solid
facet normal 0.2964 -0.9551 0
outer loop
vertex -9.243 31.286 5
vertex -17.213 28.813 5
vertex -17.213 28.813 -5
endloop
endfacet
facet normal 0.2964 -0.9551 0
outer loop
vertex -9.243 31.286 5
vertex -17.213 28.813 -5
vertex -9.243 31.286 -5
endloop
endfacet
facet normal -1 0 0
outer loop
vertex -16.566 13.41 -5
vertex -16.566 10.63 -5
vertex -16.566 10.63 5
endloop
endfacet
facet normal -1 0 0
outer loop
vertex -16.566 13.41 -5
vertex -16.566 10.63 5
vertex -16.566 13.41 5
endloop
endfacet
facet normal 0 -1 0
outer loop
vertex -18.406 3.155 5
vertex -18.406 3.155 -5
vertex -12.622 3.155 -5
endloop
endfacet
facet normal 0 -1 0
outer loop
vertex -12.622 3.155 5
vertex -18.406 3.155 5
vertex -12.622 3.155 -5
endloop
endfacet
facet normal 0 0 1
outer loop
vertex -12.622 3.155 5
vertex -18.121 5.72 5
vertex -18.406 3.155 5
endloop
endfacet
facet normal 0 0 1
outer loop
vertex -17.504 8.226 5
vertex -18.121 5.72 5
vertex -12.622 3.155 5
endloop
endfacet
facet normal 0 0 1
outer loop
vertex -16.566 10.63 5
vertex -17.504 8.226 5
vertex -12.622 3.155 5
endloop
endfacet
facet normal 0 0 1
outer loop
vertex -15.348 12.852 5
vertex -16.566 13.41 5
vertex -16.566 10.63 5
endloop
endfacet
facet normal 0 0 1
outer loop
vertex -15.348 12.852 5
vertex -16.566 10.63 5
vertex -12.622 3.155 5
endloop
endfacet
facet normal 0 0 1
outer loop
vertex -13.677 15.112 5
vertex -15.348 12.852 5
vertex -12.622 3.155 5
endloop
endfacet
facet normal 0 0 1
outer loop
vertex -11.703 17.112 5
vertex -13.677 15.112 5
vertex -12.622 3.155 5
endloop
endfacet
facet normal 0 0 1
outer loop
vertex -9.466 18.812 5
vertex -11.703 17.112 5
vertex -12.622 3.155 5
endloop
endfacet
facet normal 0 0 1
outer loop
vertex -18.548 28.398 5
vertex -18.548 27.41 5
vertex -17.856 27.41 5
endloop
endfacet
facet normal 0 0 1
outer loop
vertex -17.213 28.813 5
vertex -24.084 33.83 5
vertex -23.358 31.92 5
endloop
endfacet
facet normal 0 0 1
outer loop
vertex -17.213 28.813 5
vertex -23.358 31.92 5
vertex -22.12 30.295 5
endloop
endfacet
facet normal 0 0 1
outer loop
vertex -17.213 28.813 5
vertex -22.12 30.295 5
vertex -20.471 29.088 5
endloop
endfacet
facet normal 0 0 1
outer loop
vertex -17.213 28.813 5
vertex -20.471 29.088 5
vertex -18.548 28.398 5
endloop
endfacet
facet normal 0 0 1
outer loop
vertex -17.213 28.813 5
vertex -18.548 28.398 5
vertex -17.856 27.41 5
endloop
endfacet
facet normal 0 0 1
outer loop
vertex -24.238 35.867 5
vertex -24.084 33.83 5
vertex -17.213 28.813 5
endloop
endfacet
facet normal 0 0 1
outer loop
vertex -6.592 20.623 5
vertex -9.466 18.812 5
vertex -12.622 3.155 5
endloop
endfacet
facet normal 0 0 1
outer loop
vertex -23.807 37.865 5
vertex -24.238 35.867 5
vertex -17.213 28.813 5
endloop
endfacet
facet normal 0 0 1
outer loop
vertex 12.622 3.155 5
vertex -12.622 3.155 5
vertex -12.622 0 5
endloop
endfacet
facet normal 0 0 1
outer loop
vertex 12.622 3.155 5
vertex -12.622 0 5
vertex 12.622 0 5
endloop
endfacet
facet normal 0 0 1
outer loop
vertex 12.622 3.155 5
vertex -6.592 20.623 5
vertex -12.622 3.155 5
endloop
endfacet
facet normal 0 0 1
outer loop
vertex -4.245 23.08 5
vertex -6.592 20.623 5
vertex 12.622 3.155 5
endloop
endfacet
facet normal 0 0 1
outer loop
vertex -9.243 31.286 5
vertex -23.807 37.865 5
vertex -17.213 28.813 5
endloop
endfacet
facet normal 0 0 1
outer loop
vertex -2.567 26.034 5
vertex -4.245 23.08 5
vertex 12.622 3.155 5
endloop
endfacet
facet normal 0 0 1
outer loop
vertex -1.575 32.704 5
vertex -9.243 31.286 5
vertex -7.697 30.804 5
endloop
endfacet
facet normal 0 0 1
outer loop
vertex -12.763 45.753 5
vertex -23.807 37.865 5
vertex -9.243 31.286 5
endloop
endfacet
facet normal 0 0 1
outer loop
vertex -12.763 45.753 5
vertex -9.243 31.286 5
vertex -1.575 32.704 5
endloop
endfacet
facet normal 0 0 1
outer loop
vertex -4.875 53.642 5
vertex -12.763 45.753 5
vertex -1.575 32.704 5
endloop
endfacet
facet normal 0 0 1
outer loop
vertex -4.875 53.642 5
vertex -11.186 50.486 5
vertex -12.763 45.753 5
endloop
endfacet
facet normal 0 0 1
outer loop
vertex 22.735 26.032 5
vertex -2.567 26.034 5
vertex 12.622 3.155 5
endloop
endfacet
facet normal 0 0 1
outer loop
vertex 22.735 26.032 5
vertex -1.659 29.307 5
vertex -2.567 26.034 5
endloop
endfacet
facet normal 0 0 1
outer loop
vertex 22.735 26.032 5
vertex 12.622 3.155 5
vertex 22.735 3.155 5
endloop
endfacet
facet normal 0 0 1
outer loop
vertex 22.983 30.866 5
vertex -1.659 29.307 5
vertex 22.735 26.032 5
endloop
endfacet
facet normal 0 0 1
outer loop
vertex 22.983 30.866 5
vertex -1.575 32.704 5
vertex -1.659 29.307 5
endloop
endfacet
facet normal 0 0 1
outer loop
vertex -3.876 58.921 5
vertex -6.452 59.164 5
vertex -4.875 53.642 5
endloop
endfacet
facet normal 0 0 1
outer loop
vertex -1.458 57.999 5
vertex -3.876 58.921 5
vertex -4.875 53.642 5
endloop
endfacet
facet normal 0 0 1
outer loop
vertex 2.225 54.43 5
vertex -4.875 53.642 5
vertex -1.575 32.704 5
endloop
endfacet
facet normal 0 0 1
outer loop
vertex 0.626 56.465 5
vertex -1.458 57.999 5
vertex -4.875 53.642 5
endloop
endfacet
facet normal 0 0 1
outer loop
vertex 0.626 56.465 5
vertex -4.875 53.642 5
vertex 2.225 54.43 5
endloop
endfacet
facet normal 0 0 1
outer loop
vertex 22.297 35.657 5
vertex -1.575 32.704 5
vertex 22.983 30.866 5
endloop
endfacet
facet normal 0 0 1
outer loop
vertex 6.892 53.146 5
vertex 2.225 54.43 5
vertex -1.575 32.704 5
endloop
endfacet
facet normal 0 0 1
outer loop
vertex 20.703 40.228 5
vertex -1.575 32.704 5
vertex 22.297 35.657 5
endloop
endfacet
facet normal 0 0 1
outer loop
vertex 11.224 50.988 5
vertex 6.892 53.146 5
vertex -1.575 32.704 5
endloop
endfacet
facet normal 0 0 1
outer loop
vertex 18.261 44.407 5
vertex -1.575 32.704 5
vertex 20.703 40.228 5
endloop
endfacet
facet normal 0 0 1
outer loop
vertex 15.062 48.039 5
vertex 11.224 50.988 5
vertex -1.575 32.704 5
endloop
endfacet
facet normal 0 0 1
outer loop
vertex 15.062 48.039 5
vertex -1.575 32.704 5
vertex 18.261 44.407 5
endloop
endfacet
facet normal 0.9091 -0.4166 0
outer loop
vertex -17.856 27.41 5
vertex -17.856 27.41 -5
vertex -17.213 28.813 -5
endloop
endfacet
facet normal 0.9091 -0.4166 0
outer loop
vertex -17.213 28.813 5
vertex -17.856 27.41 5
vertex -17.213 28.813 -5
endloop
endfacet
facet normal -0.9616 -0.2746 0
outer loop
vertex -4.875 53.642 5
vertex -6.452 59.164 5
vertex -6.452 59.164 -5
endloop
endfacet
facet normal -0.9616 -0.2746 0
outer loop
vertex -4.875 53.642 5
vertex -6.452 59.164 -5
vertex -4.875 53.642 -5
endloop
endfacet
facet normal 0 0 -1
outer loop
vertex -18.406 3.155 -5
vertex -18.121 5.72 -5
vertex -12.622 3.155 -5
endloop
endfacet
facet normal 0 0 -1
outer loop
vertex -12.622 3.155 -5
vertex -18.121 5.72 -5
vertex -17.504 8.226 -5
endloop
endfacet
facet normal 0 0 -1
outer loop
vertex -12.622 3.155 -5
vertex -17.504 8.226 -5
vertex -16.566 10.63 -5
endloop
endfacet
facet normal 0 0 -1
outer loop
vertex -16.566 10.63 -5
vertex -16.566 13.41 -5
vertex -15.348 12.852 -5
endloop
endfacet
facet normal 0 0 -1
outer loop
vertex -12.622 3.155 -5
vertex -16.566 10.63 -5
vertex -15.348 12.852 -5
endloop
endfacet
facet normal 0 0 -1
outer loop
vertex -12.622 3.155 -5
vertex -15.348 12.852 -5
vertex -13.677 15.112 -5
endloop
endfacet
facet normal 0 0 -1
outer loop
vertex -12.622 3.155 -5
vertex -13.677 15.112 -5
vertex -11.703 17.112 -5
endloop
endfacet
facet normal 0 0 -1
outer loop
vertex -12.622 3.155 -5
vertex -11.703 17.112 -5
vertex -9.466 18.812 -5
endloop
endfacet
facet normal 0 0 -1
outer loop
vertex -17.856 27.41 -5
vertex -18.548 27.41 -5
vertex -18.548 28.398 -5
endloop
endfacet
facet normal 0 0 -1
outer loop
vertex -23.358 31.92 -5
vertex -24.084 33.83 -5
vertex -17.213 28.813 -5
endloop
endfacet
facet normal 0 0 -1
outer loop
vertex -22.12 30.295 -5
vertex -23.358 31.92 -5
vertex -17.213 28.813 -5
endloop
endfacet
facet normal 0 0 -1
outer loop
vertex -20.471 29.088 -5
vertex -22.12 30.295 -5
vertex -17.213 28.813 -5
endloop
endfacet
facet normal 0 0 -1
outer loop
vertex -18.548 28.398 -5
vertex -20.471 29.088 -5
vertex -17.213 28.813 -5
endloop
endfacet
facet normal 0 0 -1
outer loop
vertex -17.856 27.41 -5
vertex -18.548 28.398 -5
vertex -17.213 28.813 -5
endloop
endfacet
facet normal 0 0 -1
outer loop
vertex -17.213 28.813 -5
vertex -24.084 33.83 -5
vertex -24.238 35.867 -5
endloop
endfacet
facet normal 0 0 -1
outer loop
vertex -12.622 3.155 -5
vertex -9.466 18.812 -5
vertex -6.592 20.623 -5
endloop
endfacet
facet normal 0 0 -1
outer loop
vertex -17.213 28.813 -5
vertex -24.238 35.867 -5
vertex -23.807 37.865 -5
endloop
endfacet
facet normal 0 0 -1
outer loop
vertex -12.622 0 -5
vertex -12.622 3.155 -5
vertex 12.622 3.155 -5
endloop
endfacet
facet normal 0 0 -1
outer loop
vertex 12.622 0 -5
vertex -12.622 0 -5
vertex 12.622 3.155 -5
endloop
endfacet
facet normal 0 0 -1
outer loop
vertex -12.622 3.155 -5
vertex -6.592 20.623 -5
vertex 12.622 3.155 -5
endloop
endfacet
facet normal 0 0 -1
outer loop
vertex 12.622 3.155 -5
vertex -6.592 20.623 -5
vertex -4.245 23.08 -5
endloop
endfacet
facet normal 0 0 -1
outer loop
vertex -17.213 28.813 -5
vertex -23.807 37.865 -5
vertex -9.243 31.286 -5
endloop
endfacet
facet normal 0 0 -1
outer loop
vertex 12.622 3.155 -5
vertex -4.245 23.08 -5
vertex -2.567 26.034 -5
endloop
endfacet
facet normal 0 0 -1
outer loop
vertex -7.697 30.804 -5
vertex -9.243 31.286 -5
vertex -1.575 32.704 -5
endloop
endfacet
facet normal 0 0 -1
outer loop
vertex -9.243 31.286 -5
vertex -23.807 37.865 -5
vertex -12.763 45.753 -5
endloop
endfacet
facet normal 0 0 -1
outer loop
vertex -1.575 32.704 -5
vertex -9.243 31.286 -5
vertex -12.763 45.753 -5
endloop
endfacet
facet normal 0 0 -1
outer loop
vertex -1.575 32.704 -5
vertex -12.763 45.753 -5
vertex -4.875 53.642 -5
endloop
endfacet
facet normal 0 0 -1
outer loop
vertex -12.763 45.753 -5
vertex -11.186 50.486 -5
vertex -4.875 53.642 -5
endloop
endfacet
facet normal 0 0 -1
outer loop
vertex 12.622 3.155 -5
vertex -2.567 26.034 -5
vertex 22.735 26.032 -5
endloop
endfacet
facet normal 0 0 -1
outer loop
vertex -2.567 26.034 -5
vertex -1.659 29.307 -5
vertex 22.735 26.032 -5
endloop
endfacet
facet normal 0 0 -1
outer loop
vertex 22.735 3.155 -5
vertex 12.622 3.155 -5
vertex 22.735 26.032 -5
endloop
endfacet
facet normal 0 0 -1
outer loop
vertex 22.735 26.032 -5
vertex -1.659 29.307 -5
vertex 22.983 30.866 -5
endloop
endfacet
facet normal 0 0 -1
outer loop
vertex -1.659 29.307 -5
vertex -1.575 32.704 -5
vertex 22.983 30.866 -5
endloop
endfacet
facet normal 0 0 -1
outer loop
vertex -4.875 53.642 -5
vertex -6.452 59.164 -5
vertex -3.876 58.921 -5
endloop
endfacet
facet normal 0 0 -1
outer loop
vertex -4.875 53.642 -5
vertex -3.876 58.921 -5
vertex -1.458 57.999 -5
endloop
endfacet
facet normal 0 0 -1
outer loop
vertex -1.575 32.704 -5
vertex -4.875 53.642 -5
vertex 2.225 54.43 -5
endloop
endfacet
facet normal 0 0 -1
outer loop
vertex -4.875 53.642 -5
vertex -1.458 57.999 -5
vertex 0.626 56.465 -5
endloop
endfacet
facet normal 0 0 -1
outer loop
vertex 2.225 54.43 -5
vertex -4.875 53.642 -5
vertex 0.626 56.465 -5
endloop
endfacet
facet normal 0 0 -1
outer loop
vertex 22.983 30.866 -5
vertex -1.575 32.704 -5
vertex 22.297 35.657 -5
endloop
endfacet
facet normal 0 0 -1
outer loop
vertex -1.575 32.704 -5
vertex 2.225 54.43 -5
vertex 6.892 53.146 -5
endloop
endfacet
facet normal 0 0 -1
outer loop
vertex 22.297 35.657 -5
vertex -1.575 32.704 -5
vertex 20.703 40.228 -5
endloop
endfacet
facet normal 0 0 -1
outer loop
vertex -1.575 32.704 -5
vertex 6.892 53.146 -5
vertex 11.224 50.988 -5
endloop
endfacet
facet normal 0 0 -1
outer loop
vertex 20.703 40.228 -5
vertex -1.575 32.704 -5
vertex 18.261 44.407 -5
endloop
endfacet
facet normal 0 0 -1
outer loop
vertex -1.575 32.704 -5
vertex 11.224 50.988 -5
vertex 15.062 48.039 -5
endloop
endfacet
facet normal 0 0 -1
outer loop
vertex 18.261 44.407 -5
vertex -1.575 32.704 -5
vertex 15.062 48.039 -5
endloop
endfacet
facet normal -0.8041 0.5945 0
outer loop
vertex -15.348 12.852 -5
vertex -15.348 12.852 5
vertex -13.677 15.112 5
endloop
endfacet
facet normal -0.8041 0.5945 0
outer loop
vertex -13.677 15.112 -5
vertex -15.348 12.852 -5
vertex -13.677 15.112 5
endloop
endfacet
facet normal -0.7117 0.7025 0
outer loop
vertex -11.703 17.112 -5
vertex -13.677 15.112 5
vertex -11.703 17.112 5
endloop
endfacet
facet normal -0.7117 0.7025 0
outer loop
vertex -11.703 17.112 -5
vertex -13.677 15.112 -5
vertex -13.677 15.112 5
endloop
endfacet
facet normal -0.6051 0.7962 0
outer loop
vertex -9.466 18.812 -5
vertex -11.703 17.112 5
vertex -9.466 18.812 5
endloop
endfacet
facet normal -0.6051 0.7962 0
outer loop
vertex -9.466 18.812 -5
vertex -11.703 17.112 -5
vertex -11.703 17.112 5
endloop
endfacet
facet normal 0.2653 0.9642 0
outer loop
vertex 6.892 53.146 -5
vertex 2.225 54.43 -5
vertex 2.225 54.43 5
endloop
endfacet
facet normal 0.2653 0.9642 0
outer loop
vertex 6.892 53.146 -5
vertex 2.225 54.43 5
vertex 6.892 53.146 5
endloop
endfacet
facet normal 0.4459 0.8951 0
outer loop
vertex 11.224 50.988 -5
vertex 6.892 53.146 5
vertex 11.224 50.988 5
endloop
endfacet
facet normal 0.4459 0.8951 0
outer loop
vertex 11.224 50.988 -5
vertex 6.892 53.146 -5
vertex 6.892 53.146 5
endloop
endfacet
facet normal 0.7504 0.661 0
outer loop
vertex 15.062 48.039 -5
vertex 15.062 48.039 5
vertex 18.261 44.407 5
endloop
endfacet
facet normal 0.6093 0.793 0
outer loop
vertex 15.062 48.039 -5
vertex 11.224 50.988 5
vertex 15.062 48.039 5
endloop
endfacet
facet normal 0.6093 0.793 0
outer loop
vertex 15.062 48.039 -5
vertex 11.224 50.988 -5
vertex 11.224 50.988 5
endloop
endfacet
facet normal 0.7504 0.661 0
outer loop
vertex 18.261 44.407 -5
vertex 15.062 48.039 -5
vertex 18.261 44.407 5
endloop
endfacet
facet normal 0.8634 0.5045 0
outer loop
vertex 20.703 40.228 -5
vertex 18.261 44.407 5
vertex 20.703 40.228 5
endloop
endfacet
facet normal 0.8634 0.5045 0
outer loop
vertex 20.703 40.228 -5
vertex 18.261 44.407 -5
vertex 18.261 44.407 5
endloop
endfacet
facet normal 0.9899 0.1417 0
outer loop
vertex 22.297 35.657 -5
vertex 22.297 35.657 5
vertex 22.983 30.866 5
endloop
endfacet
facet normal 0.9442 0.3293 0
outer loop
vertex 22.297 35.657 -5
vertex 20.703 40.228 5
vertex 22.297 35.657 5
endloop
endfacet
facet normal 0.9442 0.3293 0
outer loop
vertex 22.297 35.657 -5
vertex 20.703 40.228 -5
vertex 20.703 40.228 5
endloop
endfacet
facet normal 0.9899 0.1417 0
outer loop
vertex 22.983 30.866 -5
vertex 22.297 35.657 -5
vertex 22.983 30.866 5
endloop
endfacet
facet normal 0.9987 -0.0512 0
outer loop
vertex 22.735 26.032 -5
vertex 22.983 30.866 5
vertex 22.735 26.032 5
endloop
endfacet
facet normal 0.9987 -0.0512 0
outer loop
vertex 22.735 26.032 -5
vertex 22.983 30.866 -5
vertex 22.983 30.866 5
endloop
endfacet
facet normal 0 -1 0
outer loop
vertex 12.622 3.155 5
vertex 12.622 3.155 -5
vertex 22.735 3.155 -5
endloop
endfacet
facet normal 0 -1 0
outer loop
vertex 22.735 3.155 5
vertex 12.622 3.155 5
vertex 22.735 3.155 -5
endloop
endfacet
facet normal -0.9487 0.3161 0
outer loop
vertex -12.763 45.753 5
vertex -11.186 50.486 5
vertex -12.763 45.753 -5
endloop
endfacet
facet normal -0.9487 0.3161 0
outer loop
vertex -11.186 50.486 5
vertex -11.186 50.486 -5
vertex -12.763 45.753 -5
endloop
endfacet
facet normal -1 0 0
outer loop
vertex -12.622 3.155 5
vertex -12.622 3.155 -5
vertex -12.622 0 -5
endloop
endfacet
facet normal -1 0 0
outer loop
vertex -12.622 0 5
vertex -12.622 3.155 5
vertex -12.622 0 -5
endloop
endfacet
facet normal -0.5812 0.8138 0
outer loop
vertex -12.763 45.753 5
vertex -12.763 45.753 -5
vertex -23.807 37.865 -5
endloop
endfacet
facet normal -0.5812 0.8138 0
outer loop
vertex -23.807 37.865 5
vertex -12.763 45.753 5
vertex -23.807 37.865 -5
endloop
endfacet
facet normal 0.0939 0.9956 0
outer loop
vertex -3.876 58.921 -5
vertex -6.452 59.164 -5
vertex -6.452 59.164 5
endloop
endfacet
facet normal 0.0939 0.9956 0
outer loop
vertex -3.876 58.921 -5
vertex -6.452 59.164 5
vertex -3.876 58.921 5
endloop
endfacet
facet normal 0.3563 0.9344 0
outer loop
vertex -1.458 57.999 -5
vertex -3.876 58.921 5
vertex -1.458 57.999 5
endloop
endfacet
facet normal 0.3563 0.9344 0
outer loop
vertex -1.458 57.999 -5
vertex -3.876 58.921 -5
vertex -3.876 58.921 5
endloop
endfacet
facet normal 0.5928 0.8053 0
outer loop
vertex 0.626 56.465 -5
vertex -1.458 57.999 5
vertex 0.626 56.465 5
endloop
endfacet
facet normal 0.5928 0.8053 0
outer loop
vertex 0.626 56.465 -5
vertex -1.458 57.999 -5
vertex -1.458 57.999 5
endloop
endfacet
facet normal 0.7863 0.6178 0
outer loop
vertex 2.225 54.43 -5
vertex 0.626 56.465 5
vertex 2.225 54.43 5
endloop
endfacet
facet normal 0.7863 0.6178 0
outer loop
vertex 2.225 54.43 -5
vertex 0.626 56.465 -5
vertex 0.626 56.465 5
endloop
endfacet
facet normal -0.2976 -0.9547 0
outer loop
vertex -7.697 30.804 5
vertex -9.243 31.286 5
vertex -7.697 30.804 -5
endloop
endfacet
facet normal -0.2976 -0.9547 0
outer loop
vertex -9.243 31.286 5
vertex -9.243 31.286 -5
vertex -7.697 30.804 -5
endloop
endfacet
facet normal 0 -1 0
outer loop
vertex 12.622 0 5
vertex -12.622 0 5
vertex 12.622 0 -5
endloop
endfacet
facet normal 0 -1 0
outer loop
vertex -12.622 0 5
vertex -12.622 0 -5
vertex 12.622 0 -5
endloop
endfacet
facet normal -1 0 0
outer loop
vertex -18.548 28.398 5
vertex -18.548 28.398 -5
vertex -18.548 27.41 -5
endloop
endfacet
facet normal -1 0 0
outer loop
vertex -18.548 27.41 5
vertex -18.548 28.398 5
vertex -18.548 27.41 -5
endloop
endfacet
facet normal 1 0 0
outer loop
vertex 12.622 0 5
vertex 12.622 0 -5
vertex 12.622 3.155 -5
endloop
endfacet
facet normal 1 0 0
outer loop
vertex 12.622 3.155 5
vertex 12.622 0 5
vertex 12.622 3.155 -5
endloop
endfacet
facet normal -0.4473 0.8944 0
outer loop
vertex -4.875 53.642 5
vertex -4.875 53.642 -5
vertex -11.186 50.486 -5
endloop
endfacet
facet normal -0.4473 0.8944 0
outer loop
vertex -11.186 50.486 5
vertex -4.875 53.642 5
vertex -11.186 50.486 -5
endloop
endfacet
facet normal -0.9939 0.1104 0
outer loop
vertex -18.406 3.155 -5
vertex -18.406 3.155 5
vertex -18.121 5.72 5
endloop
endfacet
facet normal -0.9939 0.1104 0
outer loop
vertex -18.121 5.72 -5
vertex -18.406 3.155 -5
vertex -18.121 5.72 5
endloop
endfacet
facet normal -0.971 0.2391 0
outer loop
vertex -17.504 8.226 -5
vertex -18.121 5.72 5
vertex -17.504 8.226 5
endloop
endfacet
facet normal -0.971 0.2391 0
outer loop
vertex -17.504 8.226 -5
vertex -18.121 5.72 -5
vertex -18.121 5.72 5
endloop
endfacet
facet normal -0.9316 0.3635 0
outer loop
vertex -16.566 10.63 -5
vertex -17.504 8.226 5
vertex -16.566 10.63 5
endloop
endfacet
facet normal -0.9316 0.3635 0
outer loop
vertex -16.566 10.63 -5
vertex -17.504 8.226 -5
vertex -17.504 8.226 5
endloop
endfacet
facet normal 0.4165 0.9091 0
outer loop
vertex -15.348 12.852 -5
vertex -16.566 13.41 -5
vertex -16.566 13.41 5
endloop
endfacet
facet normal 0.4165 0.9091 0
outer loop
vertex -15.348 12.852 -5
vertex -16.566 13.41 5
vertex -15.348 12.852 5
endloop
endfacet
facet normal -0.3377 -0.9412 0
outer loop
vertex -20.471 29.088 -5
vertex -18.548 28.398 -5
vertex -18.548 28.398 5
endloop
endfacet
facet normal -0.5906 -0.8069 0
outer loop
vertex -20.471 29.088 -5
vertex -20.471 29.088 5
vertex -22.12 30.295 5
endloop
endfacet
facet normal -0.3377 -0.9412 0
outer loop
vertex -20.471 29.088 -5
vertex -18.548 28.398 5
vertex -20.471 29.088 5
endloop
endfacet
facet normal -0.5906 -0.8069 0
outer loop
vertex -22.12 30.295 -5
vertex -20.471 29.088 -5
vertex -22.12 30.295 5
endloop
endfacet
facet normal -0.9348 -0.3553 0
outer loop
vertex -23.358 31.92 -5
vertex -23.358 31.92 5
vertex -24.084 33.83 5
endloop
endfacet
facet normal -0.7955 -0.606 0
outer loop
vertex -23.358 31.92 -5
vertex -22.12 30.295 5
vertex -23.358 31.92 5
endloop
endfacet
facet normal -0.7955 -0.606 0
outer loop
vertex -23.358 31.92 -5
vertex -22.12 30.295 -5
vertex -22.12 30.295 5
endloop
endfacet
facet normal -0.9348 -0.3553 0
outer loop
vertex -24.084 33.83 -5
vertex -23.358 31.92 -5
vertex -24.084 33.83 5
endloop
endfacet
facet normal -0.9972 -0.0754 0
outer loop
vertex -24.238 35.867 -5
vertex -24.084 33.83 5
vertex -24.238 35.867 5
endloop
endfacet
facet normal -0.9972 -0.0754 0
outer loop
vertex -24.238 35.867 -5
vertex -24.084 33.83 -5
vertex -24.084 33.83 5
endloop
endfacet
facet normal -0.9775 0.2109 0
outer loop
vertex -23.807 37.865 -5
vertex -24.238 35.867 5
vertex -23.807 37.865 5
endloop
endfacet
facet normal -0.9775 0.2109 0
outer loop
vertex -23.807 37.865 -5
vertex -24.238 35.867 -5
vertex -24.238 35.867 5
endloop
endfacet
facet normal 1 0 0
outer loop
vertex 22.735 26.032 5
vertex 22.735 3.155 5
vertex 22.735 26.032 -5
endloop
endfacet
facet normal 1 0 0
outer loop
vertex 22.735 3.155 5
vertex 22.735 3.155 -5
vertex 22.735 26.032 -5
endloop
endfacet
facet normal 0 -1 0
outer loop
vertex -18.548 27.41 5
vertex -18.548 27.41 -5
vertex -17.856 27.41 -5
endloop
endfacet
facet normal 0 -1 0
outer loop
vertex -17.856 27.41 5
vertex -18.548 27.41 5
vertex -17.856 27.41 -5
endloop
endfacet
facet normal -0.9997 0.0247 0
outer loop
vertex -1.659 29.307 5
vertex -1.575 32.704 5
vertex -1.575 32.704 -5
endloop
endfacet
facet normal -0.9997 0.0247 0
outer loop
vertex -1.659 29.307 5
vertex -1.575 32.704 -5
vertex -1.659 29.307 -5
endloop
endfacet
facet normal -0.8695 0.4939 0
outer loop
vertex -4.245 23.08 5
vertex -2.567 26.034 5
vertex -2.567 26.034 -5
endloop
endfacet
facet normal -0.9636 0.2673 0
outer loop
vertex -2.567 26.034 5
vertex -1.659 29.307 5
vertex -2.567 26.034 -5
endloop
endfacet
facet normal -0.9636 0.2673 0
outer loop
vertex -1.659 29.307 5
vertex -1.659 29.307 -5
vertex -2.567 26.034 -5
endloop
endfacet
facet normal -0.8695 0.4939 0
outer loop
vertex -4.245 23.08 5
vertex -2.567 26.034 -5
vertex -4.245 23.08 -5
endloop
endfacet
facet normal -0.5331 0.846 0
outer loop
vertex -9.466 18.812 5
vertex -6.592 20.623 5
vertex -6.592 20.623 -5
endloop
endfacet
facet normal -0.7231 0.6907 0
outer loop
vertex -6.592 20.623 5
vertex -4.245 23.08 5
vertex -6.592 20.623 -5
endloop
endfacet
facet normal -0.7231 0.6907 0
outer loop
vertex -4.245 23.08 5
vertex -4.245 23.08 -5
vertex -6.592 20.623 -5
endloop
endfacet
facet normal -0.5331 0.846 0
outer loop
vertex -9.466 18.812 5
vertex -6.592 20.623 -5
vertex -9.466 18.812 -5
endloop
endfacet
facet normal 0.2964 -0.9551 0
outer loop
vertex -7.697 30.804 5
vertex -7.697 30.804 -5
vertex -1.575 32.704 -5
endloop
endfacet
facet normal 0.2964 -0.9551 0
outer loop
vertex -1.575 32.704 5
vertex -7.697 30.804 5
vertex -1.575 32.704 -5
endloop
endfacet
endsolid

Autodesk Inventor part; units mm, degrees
ref_plane "YZ Plane" through (0, 0, 0) normal (1, 0, 0) x (0, 1, 0)
ref_plane "XZ Plane" through (0, 0, 0) normal (0, 1, 0) x (-1, 0, 0)
ref_plane "XY Plane" through (0, 0, 0) normal (0, 0, 1) x (1, 0, 0)
sketch "Boceto1" plane through (0, 0, 0) normal (0, 0, 1) x (1, 0, 0)
  line L0 (-55.5895, 69.239) -> (57.1029, 69.239) construction
  line L1 (57.1029, 69.239) -> (57.1029, -41.5752) construction
  line L2 (57.1029, -41.5752) -> (-55.5895, -41.5752) construction
  line L3 (-55.5895, -41.5752) -> (-55.5895, 69.239) construction
  line L4 (-12.6216, 0) -> (12.6216, 0)
  line L5 (12.6216, 0) -> (12.6216, 3.1554)
  line L6 (12.6216, 3.1554) -> (22.7349, 3.1554)
  line L7 (22.7349, 3.1554) -> (22.7349, 26.032)
  arc A0 (22.7349, 26.032) -> (2.2249, 54.4304) centre (-2.0657, 29.7261) ccw
  arc A1 (2.2249, 54.4304) -> (-6.4524, 59.1635) centre (-6.058, 49.5659) ccw
  line L8 (-6.4524, 59.1635) -> (-4.8747, 53.6416)
  line L9 (-4.8747, 53.6416) -> (-11.1855, 50.4862)
  line L10 (-11.1855, 50.4862) -> (-12.7632, 45.7531)
  line L11 (-12.7632, 45.7531) -> (-23.8071, 37.8647)
  arc A2 (-23.8071, 37.8647) -> (-18.5481, 28.3985) centre (-17.1295, 35.3805) ccw
  line L12 (-18.5481, 28.3985) -> (-9.2432, 31.2863)
  line L13 (-9.2432, 31.2863) -> (-7.6971, 30.8036)
  line L14 (-7.6971, 30.8036) -> (-1.5746, 32.7037)
  arc A3 (-9.4662, 18.8123) -> (-1.5746, 32.7037) centre (-15.3564, 31.3458) ccw
  arc A4 (-9.4662, 18.8123) -> (-18.4064, 3.1554) centre (1.3548, 2.2525) ccw
  line L15 (-18.4064, 3.1554) -> (-12.6216, 3.1554)
  line L16 (-12.6216, 3.1554) -> (-12.6216, 0)
  line L17 (-18.5481, 28.3985) -> (-18.5481, 27.4104)
  line L18 (-18.5481, 27.4104) -> (-17.8555, 27.4104)
  line L19 (-17.8555, 27.4104) -> (-17.213, 28.8128)
  line L20 (-16.5658, 10.6295) -> (-16.5658, 13.4104)
  line L21 (-16.5658, 13.4104) -> (-15.3475, 12.8522)
  point P0 (0, 0)
  point P1 (-18.2018, 27.4104)
  dimension "d8" = 14
  dimension "d12" = 0.3463
extrude "Extrusión1" add sketch "Boceto1" along normal mid plane 10
properties part number "KIGTH TOP abrebotella medium 1.2"
